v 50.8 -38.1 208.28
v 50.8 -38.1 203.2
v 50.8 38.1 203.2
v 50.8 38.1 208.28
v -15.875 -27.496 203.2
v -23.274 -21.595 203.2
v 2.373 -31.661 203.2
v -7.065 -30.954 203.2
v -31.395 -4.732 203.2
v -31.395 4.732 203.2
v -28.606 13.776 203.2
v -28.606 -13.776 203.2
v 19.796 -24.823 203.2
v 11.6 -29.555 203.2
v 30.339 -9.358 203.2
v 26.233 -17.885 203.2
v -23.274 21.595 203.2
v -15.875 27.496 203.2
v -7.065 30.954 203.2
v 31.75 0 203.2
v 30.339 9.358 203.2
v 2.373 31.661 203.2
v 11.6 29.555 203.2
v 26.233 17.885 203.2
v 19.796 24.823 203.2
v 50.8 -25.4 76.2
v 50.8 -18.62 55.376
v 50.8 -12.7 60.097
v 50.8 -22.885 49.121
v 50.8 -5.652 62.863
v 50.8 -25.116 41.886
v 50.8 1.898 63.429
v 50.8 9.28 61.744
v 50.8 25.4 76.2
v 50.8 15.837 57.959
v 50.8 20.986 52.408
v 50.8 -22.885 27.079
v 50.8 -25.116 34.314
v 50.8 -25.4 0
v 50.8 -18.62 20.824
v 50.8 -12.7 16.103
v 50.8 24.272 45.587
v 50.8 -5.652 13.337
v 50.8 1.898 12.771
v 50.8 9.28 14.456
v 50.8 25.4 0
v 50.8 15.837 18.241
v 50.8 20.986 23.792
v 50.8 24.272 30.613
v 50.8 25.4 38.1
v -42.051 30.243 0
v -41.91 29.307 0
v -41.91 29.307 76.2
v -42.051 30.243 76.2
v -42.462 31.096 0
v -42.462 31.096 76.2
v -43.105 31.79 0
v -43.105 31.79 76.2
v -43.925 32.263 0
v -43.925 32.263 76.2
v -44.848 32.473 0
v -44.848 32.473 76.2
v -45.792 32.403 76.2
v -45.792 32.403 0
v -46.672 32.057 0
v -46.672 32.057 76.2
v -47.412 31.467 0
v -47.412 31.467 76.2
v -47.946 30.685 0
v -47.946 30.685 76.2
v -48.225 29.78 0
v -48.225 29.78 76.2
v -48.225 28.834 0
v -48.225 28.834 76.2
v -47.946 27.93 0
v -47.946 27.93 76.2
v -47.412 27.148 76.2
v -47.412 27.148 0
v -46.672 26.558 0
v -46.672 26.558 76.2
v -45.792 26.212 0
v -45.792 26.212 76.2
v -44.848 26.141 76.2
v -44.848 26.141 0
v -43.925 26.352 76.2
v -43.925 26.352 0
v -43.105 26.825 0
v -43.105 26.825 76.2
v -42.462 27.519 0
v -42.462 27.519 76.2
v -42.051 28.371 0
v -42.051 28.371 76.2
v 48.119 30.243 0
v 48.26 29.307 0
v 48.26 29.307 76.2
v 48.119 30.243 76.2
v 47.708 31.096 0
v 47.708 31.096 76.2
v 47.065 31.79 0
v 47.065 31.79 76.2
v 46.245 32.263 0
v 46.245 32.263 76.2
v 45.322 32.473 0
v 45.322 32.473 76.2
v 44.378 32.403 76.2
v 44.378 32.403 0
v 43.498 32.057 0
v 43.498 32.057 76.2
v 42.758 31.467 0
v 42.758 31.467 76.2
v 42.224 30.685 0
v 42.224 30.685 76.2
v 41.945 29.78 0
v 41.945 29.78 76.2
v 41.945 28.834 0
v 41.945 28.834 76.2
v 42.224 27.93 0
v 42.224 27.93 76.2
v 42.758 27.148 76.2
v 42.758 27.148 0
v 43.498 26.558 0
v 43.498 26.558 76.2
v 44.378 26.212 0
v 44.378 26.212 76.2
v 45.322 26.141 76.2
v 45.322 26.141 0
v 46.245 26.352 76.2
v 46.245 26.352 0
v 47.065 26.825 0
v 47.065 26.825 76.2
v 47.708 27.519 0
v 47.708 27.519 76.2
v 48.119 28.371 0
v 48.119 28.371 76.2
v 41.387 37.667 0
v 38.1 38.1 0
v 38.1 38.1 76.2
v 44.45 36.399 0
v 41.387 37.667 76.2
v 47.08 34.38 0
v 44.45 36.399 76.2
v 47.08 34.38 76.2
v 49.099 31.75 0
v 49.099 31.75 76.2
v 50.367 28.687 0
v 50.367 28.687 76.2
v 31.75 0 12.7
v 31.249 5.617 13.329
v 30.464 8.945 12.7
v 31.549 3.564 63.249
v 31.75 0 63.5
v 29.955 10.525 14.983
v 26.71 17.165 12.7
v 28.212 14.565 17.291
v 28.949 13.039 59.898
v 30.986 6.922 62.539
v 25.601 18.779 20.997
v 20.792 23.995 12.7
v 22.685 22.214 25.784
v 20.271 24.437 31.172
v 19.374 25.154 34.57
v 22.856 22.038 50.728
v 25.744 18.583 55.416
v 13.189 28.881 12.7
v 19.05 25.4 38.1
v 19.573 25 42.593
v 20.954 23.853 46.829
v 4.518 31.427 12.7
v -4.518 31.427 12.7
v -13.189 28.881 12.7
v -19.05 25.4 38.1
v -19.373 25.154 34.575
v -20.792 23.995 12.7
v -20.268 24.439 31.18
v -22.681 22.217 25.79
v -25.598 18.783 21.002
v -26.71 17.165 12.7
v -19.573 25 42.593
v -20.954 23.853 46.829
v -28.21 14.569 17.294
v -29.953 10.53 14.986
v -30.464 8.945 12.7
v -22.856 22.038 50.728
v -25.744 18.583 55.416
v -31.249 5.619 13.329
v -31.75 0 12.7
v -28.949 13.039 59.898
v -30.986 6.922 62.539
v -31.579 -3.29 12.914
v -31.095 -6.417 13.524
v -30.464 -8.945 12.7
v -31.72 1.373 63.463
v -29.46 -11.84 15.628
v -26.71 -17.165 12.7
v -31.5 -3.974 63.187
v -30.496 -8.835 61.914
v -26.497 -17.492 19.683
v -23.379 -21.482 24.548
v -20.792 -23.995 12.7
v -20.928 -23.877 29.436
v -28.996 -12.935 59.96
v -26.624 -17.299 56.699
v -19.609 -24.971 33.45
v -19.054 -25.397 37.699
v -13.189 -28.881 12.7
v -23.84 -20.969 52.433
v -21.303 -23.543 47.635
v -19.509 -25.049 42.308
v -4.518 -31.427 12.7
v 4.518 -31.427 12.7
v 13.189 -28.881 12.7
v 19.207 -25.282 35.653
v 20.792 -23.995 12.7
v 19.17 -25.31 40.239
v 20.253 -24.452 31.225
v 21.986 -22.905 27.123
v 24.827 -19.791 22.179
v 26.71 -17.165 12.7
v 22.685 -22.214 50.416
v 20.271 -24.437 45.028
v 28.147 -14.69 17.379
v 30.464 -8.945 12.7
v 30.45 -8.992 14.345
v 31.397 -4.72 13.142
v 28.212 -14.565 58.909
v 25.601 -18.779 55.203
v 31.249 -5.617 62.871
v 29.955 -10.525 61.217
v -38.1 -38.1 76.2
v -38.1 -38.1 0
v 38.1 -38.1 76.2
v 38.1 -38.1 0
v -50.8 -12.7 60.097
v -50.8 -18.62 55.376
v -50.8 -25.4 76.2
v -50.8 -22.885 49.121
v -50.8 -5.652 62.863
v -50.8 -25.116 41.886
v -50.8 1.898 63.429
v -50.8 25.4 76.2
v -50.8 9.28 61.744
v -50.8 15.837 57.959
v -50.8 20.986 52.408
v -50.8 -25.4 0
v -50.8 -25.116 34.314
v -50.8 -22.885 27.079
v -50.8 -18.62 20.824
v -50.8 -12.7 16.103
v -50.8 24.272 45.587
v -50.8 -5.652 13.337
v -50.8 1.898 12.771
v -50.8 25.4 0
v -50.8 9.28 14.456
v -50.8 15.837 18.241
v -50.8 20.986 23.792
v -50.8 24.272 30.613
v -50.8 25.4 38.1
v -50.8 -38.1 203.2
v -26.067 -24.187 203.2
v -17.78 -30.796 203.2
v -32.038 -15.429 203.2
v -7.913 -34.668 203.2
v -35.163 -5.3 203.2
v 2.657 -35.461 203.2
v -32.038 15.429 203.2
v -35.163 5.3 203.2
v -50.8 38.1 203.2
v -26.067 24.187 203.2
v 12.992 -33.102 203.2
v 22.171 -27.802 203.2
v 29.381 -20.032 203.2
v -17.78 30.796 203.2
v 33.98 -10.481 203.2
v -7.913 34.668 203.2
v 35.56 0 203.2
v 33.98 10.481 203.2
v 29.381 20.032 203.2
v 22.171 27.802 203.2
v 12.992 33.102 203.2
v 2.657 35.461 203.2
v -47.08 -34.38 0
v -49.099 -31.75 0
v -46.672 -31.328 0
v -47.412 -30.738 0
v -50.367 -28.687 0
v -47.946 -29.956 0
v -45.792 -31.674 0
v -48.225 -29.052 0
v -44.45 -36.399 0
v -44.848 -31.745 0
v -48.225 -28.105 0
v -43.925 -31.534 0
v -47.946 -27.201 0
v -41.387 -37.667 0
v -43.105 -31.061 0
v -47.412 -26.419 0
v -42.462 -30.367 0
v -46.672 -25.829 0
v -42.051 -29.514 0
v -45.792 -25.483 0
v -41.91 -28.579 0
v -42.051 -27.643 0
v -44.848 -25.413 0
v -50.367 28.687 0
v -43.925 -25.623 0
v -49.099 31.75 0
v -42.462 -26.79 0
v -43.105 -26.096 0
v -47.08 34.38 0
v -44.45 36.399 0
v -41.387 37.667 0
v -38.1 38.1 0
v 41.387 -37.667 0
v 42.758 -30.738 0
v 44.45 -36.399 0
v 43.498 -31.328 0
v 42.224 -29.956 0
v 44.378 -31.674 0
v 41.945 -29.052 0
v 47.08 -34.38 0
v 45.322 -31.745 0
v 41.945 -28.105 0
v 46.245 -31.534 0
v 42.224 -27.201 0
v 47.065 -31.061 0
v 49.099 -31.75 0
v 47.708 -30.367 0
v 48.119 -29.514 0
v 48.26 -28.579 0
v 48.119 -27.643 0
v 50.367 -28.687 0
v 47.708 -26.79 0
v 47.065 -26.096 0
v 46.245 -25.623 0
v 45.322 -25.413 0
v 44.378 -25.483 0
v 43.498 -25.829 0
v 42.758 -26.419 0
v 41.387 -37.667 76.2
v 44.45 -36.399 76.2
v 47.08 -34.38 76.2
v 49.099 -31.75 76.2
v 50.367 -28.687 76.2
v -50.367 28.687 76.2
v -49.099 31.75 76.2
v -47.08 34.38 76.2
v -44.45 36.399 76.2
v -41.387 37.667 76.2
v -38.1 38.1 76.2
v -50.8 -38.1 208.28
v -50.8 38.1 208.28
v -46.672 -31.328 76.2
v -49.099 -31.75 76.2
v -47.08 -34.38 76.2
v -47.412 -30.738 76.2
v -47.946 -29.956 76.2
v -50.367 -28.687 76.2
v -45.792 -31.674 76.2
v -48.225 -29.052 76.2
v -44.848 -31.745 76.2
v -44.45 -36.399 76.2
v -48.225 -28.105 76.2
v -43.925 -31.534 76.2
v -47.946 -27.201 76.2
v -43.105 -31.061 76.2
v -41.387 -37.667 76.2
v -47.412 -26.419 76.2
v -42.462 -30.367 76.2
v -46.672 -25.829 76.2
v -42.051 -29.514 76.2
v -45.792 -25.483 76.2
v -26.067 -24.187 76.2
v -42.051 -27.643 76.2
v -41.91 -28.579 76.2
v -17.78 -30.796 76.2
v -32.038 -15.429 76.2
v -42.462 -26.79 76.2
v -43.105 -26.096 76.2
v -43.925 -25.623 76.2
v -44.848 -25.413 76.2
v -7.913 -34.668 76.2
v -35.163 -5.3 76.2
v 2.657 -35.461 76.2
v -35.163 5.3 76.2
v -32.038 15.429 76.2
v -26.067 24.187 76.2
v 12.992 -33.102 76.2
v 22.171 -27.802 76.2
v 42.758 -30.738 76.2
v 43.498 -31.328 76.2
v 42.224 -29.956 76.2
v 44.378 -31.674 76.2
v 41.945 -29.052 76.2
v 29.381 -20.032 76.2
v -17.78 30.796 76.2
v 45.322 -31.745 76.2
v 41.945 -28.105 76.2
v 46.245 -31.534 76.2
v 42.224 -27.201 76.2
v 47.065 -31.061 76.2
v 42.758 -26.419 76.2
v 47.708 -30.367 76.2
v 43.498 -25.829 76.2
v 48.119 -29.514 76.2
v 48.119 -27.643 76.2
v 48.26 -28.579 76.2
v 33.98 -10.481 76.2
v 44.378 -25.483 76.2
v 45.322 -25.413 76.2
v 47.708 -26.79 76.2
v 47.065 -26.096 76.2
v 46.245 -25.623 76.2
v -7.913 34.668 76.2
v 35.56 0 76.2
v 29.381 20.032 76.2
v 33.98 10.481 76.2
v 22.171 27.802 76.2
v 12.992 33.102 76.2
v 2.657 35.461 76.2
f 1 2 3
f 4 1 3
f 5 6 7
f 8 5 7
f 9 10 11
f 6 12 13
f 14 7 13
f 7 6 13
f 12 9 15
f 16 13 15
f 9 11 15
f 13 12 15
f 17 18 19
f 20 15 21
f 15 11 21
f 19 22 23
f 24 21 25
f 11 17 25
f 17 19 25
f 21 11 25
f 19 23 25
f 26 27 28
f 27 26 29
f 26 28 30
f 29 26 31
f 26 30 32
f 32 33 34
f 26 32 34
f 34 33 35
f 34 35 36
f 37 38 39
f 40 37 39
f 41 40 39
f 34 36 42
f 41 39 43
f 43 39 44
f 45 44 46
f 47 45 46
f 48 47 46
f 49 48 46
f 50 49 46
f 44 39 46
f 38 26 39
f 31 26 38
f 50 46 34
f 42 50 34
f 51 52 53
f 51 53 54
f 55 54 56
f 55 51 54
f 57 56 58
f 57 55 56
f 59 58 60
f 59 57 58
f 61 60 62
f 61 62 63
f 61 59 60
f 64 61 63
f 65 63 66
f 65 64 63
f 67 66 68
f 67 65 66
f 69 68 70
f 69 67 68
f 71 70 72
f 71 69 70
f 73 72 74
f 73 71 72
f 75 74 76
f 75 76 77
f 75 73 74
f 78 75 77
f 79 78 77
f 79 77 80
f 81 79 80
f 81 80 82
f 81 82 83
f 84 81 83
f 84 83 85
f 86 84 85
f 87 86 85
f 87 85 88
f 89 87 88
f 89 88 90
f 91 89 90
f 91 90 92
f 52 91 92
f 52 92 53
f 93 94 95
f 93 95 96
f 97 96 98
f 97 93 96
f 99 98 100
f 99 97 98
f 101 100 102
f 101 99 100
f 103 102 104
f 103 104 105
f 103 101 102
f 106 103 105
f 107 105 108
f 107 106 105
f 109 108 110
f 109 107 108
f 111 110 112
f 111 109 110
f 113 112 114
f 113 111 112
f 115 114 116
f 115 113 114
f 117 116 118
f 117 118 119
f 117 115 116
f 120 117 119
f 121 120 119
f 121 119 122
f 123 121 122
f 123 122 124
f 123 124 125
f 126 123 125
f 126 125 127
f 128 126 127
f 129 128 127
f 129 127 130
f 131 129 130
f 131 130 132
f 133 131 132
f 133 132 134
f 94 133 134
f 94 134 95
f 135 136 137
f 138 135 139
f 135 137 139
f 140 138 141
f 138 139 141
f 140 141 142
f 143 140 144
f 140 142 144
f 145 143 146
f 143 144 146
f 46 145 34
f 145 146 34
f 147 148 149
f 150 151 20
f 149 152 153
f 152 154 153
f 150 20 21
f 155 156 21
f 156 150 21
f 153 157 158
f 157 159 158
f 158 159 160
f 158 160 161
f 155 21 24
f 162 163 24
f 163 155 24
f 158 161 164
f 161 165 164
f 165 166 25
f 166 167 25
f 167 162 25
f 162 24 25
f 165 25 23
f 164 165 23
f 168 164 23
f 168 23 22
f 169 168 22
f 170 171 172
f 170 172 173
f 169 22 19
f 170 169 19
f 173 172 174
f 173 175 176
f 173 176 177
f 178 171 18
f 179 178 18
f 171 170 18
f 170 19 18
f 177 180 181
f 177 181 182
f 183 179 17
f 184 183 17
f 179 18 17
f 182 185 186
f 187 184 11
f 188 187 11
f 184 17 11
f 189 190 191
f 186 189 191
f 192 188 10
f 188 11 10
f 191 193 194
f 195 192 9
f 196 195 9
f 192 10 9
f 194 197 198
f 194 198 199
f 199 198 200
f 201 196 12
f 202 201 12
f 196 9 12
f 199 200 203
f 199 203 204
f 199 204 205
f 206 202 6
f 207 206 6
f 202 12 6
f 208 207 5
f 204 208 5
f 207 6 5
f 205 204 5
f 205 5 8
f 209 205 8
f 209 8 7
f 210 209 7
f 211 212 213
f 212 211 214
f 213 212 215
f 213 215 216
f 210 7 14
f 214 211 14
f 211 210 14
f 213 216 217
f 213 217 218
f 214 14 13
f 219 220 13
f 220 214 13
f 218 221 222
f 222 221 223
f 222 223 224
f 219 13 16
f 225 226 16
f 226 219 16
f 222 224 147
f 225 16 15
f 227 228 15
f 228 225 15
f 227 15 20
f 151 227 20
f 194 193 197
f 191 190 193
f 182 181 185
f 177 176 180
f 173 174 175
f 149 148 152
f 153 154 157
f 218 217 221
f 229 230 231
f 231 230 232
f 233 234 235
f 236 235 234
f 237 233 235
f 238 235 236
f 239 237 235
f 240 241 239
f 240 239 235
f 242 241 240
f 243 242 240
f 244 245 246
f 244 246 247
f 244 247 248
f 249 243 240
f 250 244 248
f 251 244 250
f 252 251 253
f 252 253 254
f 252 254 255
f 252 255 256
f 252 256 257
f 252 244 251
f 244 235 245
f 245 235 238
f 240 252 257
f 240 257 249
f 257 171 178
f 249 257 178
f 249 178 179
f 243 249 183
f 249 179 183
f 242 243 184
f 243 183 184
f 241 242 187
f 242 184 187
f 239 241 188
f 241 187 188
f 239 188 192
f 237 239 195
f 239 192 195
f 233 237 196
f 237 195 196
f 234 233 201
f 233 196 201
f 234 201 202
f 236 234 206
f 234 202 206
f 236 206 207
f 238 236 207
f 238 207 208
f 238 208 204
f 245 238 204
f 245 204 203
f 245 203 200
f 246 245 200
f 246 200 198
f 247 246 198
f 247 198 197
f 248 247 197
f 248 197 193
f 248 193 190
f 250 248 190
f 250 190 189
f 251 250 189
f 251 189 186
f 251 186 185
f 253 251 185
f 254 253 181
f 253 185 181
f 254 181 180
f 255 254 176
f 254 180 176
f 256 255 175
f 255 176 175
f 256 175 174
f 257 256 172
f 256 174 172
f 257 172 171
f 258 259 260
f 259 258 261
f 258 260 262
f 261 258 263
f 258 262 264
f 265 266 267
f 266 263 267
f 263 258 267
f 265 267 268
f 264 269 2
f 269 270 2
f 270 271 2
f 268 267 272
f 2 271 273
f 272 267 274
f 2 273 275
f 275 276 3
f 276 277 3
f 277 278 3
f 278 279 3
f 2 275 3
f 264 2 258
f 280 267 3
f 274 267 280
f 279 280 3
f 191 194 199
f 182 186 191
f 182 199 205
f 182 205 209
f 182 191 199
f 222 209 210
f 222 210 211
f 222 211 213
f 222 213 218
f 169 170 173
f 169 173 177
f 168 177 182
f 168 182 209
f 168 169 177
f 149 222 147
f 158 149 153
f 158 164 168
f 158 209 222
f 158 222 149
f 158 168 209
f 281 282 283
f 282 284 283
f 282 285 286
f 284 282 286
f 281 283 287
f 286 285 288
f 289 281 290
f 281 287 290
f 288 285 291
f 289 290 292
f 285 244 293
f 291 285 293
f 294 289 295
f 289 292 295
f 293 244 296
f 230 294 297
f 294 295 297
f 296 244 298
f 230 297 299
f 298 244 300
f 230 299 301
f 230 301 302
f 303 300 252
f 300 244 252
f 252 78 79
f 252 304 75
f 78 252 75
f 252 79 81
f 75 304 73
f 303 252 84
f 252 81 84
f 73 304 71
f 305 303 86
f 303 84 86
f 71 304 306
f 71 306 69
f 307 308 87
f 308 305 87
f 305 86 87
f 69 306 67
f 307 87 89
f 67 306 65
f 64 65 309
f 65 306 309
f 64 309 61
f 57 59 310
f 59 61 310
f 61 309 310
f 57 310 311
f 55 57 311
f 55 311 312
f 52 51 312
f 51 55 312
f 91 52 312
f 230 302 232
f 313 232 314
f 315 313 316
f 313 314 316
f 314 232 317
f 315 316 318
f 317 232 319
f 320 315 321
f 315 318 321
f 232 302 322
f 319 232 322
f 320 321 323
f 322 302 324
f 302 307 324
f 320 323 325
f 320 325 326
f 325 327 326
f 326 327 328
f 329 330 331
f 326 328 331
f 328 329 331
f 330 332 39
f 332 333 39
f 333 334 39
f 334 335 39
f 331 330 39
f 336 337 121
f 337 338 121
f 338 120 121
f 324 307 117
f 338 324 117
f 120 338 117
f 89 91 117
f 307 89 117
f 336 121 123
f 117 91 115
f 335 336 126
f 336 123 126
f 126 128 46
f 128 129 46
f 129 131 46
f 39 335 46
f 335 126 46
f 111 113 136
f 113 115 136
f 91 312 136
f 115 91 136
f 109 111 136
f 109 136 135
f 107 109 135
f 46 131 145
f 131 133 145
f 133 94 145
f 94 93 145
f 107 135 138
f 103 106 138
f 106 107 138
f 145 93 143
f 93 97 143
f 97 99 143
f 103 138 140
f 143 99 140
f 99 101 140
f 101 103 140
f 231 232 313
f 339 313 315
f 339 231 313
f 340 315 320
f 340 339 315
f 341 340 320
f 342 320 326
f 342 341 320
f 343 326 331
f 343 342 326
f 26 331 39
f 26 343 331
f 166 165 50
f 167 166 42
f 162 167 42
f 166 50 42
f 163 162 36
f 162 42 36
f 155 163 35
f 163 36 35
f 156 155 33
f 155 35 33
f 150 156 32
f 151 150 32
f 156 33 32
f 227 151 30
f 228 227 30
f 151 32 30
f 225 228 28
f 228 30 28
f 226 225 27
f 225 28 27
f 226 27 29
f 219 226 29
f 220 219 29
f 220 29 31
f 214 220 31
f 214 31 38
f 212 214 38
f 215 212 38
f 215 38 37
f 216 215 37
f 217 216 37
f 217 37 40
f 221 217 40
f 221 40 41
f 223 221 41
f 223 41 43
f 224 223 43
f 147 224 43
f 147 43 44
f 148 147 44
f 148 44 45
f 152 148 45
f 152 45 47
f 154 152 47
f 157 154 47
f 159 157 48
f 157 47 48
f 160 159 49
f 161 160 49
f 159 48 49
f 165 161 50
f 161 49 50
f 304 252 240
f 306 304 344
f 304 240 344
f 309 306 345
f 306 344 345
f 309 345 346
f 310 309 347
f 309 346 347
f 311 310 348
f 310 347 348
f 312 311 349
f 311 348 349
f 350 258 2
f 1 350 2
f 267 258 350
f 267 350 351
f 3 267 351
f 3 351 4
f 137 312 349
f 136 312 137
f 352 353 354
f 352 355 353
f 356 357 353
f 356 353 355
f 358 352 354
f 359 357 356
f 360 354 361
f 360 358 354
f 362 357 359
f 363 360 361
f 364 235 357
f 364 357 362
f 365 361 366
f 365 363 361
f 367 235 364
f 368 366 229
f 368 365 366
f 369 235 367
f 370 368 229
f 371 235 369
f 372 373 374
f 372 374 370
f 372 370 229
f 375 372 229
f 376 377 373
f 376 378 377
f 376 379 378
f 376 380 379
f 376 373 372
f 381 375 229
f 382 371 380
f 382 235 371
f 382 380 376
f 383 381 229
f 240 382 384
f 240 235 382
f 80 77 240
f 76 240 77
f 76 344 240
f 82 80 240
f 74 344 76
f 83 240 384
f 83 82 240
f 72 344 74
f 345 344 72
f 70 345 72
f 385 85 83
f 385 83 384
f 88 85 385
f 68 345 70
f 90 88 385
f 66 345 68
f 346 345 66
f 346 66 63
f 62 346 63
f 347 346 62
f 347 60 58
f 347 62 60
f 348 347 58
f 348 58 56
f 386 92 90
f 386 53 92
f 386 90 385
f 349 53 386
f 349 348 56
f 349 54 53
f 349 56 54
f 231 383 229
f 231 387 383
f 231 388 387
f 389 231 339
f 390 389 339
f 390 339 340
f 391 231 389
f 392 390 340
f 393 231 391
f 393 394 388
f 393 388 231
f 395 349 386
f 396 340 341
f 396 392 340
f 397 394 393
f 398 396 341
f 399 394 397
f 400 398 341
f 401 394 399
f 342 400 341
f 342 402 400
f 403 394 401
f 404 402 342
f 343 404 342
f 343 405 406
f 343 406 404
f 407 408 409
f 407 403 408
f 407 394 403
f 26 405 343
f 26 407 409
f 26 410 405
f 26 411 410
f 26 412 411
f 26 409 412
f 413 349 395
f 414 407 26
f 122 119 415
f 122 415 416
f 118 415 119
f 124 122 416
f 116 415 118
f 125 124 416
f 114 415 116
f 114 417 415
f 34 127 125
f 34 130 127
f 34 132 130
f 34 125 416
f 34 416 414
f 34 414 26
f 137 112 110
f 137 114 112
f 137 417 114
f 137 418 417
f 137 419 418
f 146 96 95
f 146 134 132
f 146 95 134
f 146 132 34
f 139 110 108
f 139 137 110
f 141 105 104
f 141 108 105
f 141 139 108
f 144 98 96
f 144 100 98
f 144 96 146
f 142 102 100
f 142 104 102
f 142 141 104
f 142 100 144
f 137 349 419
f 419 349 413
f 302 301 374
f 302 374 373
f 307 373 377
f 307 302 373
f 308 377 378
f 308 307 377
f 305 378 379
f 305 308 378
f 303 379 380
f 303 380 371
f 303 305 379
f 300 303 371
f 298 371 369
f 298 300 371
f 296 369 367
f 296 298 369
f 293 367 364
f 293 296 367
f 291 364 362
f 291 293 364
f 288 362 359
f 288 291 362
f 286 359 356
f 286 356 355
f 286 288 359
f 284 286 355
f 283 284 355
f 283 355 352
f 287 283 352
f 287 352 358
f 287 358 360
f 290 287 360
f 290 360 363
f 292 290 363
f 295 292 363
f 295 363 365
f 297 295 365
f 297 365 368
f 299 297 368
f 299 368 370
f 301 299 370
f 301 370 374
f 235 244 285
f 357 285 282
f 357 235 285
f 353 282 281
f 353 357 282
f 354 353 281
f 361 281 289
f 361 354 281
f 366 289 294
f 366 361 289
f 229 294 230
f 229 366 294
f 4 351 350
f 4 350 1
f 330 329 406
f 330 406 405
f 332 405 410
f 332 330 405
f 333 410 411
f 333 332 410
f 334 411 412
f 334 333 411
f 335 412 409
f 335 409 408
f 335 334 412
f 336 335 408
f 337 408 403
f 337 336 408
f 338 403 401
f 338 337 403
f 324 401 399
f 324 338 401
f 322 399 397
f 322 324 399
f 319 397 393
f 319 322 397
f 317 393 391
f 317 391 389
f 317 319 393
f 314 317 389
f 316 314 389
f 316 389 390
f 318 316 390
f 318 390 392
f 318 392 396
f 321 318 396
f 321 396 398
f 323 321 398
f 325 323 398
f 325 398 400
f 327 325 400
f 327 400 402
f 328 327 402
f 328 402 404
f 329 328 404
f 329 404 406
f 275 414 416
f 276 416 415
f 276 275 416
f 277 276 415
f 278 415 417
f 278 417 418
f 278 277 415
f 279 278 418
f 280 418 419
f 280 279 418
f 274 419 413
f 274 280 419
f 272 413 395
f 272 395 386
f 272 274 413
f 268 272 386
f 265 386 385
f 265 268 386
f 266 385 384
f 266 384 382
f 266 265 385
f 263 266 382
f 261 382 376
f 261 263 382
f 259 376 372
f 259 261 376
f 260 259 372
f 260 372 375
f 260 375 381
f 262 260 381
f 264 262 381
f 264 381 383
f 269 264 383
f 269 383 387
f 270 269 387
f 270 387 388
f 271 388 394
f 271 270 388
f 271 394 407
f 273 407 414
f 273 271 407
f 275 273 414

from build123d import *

# Parameters (mm, degrees)
F0_W      = 101.6
F0_H      = 76.2
F0_R      = 3.175
F1_DEPTH  = 203.2
F2_R      = 25.4
F3_DEPTH  = 101.6
F4_R      = 31.75
F5_DEPTH  = 190.5
F6_R      = 12.69999
F7_R      = 3.175
F7_R_2    = 35.56
F8_DEPTH  = 127
F10_W     = 101.6
F10_H     = 76.2
F11_DEPTH = 5.08


# Not quite as in the source:
# - a fillet or chamfer is up to 0.001 mm smaller than in the source, because OpenCascade refuses the exact size


with BuildPart() as f1:
    # F0 (on Top) → F1 (new body)
    with BuildSketch(Plane.XY):
        Rectangle(F0_W, F0_H)
        with Locations((-45.085, -28.5786420731)):
            Circle(F0_R, mode=Mode.SUBTRACT)
        with Locations((45.085, -28.5786420731)):
            Circle(F0_R, mode=Mode.SUBTRACT)
        with Locations((-45.085, 29.3072120343)):
            Circle(F0_R, mode=Mode.SUBTRACT)
        with Locations((45.085, 29.3072120343)):
            Circle(F0_R, mode=Mode.SUBTRACT)
    extrude(amount=F1_DEPTH)

    # F2 (on face) → F3 (cut)
    with BuildSketch(Plane.YZ.offset(50.8)):
        with Locations((0, 38.1)):
            Circle(F2_R)
    extrude(amount=-F3_DEPTH, mode=Mode.SUBTRACT)

    # F4 (on face) → F5 (cut)
    with BuildSketch(Plane.XY.offset(203.2)):
        Circle(F4_R)
    extrude(amount=-F5_DEPTH, mode=Mode.SUBTRACT)

    # F6 (radius 12.7 in the source; OpenCascade refuses exactly that, so slightly less here)
    f6_edges = [f1.edges().sort_by_distance(p)[0] for p in [
        (-50.8, 38.1, 101.6),
        (-50.8, -38.1, 101.6),
        (50.8, -38.1, 101.6),
        (50.8, 38.1, 101.6),
    ]]
    fillet(f6_edges, radius=F6_R)

    # F7 (on face) → F8 (cut)
    with BuildSketch(Plane.XY.offset(203.2)):
        with BuildLine():
            ThreePointArc((50.8, 25.40001), (47.08025905, 34.38025905), (38.10001, 38.1))
            Line((38.10001, 38.1), (-38.10001, 38.1))
            ThreePointArc((-38.10001, 38.1), (-47.08025905, 34.38025905), (-50.8, 25.40001))
            Line((-50.8, 25.40001), (-50.8, -25.40001))
            ThreePointArc((-50.8, -25.40001), (-47.08025905, -34.38025905), (-38.10001, -38.1))
            Line((-38.10001, -38.1), (38.10001, -38.1))
            ThreePointArc((38.10001, -38.1), (47.08025905, -34.38025905), (50.8, -25.40001))
            Line((50.8, -25.40001), (50.8, 25.40001))
        make_face()
        with Locations((-45.085, -28.5786420731)):
            Circle(F7_R, mode=Mode.SUBTRACT)
        with Locations((45.085, -28.5786420731)):
            Circle(F7_R, mode=Mode.SUBTRACT)
        Circle(F7_R_2, mode=Mode.SUBTRACT)
        with Locations((-45.085, 29.3072120343)):
            Circle(F7_R, mode=Mode.SUBTRACT)
        with Locations((45.085, 29.3072120343)):
            Circle(F7_R, mode=Mode.SUBTRACT)
    extrude(amount=-F8_DEPTH, mode=Mode.SUBTRACT)

    # F10 (on offset) → F11 (join)
    with BuildSketch(Plane.XY.offset(203.2)):
        Rectangle(F10_W, F10_H)
    extrude(amount=F11_DEPTH)


solid = f1.part
